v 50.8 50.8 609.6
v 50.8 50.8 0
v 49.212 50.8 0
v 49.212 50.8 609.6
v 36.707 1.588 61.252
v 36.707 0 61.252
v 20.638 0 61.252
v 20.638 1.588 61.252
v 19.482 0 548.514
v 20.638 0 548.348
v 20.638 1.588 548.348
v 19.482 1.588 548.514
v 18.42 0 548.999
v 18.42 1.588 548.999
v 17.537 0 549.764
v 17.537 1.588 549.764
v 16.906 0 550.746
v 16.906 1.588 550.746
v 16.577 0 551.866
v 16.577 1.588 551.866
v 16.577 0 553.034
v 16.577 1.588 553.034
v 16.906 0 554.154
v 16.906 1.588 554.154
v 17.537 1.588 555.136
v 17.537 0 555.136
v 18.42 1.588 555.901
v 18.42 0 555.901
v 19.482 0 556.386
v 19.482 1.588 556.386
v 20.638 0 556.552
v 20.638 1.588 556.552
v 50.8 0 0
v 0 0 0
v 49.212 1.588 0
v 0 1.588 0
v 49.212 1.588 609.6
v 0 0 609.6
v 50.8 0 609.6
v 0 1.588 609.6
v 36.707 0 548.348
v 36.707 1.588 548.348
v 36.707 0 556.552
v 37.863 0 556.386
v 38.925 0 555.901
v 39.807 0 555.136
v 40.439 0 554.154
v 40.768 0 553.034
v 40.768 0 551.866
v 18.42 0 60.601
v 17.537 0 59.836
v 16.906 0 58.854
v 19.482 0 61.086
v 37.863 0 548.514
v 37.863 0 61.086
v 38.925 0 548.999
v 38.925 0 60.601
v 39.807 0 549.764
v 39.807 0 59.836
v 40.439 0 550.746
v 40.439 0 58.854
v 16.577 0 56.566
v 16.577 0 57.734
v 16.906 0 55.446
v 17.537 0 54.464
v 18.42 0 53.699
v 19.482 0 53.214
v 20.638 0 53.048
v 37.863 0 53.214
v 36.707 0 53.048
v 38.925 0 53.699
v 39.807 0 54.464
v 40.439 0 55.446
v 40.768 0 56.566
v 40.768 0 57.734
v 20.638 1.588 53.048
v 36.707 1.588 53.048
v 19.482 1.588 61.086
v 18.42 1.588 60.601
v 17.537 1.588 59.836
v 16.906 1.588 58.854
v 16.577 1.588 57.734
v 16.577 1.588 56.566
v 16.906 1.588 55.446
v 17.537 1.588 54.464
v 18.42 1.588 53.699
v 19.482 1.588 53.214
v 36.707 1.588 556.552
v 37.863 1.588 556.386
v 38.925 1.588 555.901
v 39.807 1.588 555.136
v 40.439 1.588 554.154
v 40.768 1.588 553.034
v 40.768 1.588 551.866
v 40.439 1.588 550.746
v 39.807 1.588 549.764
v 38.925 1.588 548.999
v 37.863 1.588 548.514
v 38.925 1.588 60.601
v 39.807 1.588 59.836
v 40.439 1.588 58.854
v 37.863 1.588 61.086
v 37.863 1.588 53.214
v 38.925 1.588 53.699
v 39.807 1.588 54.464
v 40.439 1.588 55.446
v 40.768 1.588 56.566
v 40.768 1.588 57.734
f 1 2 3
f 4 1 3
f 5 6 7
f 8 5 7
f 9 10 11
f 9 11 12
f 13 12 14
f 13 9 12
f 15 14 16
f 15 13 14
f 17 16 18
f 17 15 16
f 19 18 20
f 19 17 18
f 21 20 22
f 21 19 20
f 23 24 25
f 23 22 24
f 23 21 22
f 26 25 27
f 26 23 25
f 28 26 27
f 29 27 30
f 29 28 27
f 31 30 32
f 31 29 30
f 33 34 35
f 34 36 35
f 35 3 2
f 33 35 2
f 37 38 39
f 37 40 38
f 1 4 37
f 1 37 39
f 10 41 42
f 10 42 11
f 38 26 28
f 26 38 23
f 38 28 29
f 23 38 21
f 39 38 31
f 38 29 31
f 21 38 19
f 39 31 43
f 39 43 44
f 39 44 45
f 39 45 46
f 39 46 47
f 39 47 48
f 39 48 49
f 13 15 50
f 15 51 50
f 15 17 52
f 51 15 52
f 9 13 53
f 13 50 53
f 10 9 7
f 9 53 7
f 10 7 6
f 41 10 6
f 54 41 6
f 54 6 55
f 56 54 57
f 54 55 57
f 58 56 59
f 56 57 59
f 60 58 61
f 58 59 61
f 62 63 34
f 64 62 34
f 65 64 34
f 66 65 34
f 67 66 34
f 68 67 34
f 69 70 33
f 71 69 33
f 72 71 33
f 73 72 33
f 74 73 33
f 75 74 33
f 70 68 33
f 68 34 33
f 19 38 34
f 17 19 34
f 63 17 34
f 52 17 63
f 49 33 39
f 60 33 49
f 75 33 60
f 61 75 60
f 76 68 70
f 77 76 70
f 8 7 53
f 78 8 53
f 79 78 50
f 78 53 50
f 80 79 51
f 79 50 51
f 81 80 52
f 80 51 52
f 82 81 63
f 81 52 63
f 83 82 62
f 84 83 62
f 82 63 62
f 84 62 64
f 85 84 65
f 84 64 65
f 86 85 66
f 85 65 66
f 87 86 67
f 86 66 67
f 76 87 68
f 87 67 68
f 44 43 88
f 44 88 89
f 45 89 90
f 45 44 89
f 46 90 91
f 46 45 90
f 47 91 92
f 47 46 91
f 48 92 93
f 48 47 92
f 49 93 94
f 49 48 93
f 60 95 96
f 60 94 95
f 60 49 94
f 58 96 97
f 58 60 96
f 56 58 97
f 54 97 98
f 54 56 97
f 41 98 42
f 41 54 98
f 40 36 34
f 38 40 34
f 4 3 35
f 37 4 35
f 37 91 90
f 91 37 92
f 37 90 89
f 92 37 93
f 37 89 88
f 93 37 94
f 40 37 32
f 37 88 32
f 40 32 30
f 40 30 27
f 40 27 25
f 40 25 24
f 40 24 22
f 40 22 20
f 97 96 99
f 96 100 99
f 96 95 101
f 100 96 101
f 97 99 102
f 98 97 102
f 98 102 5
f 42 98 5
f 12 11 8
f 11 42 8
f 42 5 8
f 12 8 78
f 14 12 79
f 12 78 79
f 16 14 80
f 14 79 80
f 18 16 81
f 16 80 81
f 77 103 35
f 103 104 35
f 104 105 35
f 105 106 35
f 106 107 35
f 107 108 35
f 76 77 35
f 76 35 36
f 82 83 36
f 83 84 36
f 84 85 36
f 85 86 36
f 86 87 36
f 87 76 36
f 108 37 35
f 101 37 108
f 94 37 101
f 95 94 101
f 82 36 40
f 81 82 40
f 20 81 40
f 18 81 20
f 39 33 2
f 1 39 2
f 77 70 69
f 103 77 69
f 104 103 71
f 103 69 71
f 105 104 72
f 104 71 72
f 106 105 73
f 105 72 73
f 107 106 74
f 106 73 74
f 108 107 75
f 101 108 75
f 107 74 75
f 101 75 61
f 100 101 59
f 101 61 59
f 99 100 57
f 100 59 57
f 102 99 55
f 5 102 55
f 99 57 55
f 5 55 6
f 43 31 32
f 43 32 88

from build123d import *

# Parameters (mm, degrees)
EXTRUDE1_DEPTH     = 609.6
CUT_EXTRUDE1_DEPTH = 51.8


with BuildPart() as part:
    # Sketch1 → Extrude1 (new body)
    with BuildSketch(Plane.XY):
        Polygon((0, 0), (50.8, 0), (50.8, 50.8), (49.2125, 50.8), (49.2125, 1.5875), (0, 1.5875), align=None)
    extrude(amount=EXTRUDE1_DEPTH)

    # Sketch2 → Cut-Extrude1 (cut, through all)
    with BuildSketch(Plane.XZ):
        with BuildLine():
            Line((20.6375, 556.5521), (36.707174868, 556.5521))
            ThreePointArc((36.707174868, 556.5521), (40.809274868, 552.45), (36.707174868, 548.3479))
            Line((36.707174868, 548.3479), (20.6375, 548.3479))
            ThreePointArc((20.6375, 548.3479), (16.5354, 552.45), (20.6375, 556.5521))
        make_face()
        with BuildLine():
            Line((36.707174868, 61.2521), (20.6375, 61.2521))
            ThreePointArc((20.6375, 61.2521), (16.5354, 57.15), (20.6375, 53.0479))
            Line((20.6375, 53.0479), (36.707174868, 53.0479))
            ThreePointArc((36.707174868, 53.0479), (40.809274868, 57.15), (36.707174868, 61.2521))
        make_face()
    extrude(amount=-CUT_EXTRUDE1_DEPTH, mode=Mode.SUBTRACT)


solid = part.part
